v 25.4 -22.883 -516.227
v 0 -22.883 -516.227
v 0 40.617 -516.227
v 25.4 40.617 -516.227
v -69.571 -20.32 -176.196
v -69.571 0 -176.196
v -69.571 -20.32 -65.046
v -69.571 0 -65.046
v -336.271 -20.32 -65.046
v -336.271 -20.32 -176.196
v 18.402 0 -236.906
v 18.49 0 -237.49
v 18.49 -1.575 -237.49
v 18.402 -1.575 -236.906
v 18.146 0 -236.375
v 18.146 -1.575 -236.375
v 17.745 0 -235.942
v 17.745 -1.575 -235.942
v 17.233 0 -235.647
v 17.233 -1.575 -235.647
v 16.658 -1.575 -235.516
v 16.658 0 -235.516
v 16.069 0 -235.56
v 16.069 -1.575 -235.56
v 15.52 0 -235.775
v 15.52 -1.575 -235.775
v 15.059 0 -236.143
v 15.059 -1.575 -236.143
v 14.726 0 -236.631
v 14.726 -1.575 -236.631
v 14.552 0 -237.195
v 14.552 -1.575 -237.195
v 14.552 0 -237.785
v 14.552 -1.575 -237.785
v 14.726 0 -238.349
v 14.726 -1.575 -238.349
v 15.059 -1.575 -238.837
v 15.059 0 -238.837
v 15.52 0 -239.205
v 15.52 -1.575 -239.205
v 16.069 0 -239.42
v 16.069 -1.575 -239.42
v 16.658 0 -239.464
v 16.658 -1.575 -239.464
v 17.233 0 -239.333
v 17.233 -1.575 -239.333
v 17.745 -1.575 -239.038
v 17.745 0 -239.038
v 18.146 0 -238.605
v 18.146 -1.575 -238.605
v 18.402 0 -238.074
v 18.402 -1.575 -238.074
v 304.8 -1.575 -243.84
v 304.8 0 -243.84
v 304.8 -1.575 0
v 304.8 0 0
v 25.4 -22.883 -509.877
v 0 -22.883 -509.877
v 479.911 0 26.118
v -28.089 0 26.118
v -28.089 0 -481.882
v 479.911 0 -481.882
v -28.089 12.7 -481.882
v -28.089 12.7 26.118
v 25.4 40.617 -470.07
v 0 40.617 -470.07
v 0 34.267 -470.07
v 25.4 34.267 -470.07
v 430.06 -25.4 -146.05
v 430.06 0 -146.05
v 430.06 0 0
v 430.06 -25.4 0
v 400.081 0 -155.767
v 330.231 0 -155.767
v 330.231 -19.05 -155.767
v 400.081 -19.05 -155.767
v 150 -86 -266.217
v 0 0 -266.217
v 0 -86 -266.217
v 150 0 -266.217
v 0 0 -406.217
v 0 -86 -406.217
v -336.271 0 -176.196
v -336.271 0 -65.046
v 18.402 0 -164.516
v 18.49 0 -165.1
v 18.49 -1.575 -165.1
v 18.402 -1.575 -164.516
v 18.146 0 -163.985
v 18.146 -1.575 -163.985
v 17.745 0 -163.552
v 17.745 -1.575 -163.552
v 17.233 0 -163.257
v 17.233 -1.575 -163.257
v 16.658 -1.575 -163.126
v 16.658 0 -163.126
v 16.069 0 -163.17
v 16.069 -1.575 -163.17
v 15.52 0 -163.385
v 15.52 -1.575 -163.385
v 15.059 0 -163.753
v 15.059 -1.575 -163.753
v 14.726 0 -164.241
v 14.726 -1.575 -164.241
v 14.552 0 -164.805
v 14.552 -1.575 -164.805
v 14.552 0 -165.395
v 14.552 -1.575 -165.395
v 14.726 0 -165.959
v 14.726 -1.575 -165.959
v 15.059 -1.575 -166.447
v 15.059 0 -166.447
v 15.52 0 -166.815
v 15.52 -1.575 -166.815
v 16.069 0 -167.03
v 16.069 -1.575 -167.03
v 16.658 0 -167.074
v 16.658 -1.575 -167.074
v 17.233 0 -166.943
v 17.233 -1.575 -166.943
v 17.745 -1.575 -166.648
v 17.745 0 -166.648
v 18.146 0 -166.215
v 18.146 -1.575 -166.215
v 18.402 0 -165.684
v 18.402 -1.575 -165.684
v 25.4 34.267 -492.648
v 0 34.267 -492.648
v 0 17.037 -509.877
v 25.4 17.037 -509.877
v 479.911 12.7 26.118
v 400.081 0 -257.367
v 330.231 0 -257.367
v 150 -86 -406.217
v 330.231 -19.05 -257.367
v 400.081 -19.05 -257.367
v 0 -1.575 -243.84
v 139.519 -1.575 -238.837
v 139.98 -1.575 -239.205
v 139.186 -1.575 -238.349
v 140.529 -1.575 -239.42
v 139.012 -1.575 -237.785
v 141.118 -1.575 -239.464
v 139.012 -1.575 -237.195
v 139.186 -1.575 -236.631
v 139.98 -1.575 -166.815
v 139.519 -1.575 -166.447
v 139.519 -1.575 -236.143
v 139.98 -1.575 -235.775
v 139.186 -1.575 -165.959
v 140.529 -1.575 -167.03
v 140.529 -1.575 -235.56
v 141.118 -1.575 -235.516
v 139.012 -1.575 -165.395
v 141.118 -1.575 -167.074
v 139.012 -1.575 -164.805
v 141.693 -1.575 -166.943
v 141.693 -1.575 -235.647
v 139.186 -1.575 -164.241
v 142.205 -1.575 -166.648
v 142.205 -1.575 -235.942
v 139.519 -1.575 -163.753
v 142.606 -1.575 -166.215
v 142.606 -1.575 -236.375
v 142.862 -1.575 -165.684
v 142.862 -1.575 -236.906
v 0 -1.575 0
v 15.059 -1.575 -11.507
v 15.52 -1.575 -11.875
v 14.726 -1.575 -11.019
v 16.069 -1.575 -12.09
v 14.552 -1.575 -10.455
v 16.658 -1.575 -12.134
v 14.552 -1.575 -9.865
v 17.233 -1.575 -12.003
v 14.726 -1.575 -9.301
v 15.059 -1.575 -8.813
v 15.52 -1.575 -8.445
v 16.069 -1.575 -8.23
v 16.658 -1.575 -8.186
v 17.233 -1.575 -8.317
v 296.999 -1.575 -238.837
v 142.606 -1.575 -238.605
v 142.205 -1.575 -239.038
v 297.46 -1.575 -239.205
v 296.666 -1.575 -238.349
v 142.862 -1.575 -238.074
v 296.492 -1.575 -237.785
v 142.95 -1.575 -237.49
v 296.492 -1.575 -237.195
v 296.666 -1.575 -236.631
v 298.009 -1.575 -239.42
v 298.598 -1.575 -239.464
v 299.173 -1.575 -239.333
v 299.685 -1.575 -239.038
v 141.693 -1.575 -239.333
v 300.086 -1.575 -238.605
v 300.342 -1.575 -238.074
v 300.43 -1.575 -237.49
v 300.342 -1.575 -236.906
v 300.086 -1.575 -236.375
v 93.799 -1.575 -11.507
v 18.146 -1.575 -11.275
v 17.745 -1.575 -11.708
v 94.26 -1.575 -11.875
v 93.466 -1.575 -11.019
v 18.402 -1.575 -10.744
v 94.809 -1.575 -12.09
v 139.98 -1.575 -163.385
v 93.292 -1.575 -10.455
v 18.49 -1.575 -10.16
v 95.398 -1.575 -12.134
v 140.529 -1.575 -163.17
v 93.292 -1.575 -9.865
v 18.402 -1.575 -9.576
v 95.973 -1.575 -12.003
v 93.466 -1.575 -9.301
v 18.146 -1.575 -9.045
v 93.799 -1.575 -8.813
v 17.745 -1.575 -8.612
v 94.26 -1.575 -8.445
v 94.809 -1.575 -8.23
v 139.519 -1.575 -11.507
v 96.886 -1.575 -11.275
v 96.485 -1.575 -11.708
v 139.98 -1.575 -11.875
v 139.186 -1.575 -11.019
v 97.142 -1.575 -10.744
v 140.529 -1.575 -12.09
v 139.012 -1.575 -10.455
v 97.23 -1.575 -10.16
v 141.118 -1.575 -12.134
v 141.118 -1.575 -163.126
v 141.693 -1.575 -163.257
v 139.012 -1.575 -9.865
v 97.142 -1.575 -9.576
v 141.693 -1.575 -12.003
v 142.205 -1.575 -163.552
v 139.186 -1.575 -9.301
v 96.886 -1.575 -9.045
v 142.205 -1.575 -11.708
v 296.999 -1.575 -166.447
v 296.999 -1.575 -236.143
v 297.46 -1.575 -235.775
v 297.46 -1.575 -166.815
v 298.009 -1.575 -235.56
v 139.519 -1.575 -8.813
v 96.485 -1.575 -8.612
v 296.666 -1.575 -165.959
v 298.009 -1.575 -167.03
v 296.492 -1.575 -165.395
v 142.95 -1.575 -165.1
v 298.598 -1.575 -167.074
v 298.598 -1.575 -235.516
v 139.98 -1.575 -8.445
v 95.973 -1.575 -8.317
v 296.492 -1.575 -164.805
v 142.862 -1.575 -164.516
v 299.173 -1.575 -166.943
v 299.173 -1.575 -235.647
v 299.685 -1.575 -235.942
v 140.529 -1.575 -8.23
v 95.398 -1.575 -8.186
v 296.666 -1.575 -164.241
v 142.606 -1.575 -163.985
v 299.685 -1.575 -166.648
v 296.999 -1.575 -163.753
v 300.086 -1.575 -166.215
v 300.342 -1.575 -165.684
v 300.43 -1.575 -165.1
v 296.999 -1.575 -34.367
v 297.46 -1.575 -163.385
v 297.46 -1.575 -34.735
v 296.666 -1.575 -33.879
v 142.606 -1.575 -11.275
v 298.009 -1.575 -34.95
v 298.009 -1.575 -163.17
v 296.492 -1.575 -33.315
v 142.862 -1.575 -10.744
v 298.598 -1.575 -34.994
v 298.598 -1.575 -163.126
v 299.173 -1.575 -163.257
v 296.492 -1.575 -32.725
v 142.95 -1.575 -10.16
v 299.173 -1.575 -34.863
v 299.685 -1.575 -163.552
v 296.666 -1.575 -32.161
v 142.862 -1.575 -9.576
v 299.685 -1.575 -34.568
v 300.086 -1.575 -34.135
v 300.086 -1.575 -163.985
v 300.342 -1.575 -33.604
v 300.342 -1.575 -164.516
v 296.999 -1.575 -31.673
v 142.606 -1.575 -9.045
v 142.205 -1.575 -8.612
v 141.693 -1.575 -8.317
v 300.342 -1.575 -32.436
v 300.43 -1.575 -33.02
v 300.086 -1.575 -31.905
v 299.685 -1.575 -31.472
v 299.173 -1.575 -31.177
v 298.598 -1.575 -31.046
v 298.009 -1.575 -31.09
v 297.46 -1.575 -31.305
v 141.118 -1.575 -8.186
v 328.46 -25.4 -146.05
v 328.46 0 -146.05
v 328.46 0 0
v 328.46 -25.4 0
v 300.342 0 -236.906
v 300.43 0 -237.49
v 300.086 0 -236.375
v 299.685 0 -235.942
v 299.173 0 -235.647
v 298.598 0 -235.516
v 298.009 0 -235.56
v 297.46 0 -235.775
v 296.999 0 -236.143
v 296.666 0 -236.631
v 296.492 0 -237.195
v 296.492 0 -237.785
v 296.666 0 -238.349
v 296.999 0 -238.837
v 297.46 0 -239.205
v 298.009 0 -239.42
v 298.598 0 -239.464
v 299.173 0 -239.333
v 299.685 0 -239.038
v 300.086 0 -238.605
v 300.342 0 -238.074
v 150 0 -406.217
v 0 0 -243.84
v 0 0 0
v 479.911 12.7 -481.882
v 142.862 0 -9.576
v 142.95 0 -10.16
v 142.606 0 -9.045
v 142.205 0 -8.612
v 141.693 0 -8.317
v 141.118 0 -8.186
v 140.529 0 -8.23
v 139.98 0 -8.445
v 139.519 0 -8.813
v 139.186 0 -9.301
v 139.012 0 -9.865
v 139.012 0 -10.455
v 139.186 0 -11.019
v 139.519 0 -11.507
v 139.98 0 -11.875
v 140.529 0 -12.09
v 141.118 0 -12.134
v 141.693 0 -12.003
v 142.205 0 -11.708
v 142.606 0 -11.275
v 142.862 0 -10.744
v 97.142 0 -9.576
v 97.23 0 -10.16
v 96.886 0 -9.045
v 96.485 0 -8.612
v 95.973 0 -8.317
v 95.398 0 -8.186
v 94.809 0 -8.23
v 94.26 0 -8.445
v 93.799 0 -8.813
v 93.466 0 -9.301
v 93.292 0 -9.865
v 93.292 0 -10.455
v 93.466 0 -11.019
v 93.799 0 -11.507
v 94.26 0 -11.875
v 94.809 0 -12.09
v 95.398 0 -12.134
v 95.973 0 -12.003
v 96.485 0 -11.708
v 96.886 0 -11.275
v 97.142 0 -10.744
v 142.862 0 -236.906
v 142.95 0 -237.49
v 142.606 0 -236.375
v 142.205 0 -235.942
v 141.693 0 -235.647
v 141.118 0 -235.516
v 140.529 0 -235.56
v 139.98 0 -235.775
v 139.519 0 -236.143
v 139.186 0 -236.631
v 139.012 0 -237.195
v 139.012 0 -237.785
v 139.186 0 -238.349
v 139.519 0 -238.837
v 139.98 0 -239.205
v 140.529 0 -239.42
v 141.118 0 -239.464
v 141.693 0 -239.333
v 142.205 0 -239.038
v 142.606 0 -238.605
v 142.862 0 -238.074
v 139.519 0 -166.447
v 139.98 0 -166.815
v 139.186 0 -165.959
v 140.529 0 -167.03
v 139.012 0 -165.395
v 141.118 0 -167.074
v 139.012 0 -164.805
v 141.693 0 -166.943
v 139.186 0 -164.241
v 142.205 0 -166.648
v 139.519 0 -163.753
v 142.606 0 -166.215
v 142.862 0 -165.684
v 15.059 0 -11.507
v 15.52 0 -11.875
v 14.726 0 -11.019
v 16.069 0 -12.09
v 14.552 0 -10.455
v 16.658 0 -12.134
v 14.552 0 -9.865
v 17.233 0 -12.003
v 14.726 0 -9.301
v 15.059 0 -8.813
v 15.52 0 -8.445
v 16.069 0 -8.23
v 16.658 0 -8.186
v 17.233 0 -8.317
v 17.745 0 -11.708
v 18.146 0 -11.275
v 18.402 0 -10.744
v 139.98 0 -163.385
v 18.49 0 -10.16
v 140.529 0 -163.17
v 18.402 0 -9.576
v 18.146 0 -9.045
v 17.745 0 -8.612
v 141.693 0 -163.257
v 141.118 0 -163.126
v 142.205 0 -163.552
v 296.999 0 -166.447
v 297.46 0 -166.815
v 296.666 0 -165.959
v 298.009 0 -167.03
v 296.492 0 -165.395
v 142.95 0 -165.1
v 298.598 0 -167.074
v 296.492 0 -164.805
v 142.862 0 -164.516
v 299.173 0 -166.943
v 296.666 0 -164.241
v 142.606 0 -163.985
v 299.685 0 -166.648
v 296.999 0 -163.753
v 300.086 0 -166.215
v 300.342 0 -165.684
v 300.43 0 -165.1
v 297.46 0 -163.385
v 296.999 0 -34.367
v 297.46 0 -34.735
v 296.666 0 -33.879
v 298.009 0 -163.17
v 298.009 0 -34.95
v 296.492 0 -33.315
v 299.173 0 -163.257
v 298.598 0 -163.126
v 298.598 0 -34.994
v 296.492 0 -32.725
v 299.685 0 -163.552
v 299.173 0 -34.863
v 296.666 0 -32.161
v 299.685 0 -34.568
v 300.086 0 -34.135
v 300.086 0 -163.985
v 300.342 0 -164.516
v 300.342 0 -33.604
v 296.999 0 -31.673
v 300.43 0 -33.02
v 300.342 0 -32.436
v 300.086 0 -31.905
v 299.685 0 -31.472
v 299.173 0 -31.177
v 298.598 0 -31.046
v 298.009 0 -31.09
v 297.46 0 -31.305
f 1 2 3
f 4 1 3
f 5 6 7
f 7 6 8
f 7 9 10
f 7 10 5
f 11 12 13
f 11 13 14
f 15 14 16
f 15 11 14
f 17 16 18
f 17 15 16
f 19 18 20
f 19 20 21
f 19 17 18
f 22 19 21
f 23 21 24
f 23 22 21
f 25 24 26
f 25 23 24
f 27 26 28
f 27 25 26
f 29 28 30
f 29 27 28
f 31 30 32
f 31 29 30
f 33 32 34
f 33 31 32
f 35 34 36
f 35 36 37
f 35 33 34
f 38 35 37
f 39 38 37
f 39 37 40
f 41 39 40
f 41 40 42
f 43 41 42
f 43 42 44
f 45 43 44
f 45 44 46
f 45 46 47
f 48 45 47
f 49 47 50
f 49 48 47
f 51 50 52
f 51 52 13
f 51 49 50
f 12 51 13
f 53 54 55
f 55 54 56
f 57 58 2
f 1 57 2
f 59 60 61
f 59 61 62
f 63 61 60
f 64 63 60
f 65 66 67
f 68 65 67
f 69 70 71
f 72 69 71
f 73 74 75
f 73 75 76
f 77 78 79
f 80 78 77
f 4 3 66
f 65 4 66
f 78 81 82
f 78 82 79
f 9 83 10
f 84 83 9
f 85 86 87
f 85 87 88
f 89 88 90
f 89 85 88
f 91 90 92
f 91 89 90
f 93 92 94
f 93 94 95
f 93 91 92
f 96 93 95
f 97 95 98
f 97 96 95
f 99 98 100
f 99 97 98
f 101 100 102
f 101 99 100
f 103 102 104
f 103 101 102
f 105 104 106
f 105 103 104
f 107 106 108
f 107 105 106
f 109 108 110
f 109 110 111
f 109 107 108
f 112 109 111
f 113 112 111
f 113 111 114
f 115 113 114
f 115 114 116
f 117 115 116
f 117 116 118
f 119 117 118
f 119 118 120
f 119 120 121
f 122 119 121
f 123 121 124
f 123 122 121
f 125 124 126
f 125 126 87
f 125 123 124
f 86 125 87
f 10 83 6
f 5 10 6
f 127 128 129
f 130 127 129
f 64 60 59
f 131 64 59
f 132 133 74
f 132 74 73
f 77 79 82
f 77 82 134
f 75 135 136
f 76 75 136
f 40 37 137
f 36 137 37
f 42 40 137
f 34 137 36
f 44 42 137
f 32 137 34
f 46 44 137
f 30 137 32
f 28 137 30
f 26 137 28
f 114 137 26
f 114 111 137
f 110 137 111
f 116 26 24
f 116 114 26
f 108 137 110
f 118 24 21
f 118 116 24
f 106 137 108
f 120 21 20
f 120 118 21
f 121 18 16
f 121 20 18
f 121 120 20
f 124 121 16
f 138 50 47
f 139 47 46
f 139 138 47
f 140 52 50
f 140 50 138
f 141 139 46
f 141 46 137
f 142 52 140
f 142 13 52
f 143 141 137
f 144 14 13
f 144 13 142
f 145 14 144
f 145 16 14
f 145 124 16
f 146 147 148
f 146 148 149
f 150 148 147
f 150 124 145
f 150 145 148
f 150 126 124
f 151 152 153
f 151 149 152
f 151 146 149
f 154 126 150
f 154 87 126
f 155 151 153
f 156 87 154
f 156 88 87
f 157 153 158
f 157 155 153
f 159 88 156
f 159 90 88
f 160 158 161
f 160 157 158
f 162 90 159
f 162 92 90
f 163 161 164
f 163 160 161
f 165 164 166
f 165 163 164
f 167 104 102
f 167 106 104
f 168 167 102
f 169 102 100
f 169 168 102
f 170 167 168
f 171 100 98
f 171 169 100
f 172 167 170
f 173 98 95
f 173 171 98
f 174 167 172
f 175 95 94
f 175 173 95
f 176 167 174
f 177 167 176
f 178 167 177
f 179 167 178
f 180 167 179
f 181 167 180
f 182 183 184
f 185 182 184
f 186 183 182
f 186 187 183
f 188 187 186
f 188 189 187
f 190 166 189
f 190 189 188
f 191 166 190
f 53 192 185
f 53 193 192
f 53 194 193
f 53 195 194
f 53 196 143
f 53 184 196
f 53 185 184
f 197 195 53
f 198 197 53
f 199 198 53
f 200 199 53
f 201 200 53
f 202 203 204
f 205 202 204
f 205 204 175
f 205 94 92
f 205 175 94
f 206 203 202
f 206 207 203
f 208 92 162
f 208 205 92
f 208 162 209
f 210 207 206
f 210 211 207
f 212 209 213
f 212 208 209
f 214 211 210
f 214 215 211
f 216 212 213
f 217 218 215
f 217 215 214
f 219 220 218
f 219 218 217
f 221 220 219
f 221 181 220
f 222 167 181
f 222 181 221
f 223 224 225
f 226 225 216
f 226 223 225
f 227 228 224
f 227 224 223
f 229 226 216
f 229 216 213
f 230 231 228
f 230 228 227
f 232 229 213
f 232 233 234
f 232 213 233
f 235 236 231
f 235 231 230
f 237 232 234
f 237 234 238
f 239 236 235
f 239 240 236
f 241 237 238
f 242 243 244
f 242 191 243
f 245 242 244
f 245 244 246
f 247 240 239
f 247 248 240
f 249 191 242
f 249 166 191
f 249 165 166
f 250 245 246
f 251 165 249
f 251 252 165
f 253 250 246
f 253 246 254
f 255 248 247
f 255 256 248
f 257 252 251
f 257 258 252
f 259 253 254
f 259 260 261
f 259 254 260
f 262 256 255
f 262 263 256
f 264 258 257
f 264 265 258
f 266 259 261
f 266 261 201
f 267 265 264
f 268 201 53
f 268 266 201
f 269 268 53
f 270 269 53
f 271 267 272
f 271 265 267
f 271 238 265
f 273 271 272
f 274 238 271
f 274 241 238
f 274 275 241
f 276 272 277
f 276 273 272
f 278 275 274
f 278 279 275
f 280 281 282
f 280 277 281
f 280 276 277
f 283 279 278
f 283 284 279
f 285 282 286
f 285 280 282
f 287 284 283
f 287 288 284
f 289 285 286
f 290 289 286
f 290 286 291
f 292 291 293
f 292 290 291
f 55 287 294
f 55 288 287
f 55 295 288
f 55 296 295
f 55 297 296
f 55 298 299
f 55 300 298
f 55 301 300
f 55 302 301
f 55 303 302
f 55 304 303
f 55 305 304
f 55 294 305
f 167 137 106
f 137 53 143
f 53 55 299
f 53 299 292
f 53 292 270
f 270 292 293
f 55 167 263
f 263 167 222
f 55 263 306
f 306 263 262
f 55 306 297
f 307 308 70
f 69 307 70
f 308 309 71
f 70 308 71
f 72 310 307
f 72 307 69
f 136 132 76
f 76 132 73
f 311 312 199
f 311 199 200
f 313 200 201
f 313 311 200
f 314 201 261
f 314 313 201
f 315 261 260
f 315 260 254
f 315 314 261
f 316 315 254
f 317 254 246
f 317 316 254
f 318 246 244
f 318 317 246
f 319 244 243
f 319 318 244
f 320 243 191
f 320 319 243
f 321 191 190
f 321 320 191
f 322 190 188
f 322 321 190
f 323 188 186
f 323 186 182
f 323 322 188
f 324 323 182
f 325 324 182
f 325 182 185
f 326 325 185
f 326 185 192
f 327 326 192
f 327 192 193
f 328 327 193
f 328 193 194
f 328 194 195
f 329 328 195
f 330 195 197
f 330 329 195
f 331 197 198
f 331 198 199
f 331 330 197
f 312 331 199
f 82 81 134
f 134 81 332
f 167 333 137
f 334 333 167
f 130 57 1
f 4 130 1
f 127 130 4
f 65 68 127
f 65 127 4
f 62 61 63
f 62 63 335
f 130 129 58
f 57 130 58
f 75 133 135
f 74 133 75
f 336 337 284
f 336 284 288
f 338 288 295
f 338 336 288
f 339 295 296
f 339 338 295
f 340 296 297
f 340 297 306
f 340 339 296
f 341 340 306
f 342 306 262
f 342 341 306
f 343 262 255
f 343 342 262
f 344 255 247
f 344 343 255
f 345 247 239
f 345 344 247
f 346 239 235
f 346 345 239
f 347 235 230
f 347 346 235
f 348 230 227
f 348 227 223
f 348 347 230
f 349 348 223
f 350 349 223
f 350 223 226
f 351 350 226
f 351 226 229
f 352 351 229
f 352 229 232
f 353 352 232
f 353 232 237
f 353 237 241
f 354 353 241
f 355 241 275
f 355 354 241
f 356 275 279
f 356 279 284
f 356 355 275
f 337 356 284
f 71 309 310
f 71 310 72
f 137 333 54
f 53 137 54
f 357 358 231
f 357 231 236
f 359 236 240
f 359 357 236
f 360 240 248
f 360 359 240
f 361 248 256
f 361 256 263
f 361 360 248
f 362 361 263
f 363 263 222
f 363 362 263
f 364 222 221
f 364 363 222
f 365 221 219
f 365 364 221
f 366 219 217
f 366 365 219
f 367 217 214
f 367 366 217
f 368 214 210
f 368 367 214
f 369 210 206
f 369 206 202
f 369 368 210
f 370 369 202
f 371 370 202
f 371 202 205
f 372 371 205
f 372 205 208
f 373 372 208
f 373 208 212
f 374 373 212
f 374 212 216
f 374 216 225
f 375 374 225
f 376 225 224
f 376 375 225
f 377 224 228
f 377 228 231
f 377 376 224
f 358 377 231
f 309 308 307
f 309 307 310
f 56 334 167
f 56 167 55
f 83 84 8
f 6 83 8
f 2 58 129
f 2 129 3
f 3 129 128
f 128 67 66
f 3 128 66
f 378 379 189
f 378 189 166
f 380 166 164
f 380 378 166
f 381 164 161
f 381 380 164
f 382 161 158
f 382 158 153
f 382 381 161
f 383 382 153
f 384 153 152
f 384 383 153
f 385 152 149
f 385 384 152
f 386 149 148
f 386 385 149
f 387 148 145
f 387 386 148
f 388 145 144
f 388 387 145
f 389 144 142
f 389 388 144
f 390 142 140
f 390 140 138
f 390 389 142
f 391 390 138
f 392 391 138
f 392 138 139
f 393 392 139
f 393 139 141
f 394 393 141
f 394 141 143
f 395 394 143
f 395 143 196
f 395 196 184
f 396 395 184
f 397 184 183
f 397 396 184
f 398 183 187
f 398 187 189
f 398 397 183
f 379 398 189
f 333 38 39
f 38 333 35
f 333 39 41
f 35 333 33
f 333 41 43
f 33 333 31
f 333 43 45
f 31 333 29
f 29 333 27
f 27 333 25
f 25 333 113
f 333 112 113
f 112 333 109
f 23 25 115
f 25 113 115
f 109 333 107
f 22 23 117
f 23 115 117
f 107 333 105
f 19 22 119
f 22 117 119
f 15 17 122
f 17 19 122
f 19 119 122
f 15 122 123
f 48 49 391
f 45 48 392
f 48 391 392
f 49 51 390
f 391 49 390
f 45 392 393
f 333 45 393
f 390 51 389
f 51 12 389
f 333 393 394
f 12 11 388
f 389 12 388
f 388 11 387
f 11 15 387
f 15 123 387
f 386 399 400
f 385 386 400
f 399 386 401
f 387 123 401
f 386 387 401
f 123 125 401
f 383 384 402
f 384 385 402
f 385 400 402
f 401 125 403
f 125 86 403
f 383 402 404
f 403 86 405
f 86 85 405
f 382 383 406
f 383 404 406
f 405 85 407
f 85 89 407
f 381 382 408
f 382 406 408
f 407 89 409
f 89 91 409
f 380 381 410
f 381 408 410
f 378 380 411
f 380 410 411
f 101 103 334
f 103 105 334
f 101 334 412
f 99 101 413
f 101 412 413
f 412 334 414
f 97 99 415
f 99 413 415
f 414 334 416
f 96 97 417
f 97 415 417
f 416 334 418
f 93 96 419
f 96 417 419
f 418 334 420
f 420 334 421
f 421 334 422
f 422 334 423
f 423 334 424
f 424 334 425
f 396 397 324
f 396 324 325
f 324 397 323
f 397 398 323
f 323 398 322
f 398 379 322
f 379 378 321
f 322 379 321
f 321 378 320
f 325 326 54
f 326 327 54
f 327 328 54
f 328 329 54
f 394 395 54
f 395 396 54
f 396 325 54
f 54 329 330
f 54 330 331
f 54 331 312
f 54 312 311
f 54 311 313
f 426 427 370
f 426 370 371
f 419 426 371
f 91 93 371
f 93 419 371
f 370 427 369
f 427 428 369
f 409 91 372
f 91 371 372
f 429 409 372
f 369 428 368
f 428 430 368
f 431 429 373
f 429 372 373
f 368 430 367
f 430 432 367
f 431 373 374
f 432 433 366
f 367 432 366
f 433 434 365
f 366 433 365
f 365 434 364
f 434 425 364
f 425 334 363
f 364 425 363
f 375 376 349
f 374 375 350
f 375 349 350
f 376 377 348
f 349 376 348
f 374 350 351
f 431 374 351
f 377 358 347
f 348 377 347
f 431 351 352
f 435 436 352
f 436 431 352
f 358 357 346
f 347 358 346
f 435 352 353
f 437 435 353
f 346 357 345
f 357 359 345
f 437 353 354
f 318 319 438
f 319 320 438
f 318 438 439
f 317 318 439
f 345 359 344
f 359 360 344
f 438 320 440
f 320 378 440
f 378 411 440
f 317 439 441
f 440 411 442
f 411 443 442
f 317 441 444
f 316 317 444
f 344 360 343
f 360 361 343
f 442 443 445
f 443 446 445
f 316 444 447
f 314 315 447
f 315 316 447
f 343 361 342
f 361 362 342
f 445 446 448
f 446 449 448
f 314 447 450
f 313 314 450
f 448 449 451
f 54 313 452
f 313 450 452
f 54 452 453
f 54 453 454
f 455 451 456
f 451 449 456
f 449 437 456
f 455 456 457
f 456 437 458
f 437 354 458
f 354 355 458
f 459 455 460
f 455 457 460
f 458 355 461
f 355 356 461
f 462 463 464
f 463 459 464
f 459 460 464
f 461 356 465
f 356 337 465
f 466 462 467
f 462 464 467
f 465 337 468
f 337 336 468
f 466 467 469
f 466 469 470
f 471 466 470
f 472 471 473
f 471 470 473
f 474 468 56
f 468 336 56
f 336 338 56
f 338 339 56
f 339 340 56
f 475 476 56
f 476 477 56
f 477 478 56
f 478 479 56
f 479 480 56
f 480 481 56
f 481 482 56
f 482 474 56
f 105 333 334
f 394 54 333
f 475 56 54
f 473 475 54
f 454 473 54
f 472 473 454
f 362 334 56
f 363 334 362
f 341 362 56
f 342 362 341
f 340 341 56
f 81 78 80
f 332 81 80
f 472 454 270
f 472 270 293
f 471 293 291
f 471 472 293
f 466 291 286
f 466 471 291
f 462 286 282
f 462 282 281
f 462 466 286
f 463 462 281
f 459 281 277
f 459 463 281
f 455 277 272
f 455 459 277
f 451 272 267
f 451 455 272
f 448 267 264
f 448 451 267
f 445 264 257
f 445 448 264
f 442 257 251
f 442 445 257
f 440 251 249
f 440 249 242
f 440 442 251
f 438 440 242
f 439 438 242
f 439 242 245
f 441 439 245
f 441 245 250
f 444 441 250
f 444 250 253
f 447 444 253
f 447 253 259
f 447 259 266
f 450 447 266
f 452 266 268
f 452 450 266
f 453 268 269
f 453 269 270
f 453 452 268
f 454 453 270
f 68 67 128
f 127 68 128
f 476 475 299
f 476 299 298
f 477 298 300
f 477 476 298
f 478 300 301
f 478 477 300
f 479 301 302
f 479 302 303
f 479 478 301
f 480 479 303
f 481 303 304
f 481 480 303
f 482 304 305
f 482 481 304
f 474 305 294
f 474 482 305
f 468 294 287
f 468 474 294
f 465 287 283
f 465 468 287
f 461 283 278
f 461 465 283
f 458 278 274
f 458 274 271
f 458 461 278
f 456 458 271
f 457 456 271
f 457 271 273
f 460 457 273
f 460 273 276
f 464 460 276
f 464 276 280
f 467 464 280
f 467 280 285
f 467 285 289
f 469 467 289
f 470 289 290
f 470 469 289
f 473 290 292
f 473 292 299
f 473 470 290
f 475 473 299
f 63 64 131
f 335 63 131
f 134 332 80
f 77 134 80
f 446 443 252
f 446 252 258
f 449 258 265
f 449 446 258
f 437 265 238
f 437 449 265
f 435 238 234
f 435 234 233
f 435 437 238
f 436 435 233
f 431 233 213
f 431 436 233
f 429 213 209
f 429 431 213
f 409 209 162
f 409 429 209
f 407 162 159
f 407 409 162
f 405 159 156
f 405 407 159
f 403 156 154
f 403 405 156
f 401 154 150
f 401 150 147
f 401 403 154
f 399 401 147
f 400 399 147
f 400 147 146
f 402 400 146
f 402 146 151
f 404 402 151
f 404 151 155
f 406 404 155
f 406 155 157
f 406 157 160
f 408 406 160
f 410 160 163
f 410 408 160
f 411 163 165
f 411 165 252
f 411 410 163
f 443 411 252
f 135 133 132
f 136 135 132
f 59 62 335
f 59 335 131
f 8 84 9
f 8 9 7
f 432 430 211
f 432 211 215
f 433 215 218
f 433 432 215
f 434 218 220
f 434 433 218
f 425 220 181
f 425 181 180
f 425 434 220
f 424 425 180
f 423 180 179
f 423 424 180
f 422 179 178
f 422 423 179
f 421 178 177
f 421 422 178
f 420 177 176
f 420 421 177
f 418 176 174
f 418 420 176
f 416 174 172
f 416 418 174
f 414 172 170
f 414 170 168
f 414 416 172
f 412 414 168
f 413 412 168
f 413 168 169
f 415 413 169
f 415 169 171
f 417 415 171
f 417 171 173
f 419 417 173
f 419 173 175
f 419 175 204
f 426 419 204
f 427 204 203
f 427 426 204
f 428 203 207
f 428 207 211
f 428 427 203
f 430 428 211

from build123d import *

# Parameters (mm, degrees)
F0_W      = 304.8
F0_H      = 243.84
F0_R      = 1.98
F1_DEPTH  = 1.5748
F2_W      = 150
F2_H      = 140
F3_DEPTH  = 86
F4_W      = 266.7
F4_H      = 111.1504
F5_DEPTH  = 20.32
F6_W      = 101.6
F6_H      = 146.05
F7_DEPTH  = 25.4
F8_W      = 69.85
F8_H      = 101.6
F9_DEPTH  = 19.05
F10_W     = 508
F10_H     = 508
F11_DEPTH = 12.7
F13_DEPTH = 25.4


with BuildPart() as f1:
    # F0 (on Front) → F1 (new body)
    with BuildSketch(Plane.XZ):
        with Locations((152.4, -121.92)):
            Rectangle(F0_W, F0_H)
        with Locations((16.51, -237.49)):
            Circle(F0_R, mode=Mode.SUBTRACT)
        with Locations((140.97, -237.49)):
            Circle(F0_R, mode=Mode.SUBTRACT)
        with Locations((16.51, -165.1)):
            Circle(F0_R, mode=Mode.SUBTRACT)
        with Locations((140.97, -165.1)):
            Circle(F0_R, mode=Mode.SUBTRACT)
        with Locations((298.45, -237.49)):
            Circle(F0_R, mode=Mode.SUBTRACT)
        with Locations((298.45, -165.1)):
            Circle(F0_R, mode=Mode.SUBTRACT)
        with Locations((16.51, -10.16)):
            Circle(F0_R, mode=Mode.SUBTRACT)
        with Locations((95.25, -10.16)):
            Circle(F0_R, mode=Mode.SUBTRACT)
        with Locations((140.97, -10.16)):
            Circle(F0_R, mode=Mode.SUBTRACT)
        with Locations((298.45, -33.02)):
            Circle(F0_R, mode=Mode.SUBTRACT)
    extrude(amount=F1_DEPTH)


with BuildPart() as f3:
    # F2 (on Front) → F3 (new body)
    with BuildSketch(Plane.XZ):
        with Locations((75, -336.217142)):
            Rectangle(F2_W, F2_H)
    extrude(amount=F3_DEPTH)


with BuildPart() as f5:
    # F4 (on Front) → F5 (new body)
    with BuildSketch(Plane.XZ):
        with Locations((-202.921405, -120.621153)):
            Rectangle(F4_W, F4_H)
    extrude(amount=F5_DEPTH)


with BuildPart() as f7:
    # F6 (on Front) → F7 (new body)
    with BuildSketch(Plane.XZ):
        with Locations((379.260089, -73.025)):
            Rectangle(F6_W, F6_H)
    extrude(amount=F7_DEPTH)


with BuildPart() as f9:
    # F8 (on Front) → F9 (new body)
    with BuildSketch(Plane.XZ):
        with Locations((365.155711, -206.566785)):
            Rectangle(F8_W, F8_H)
    extrude(amount=F9_DEPTH)


with BuildPart() as f11:
    # F10 (on Front) → F11 (new body)
    with BuildSketch(Plane.XZ):
        with Locations((225.910594, -227.881701)):
            Rectangle(F10_W, F10_H)
    extrude(amount=-F11_DEPTH)


with BuildPart() as f13:
    # F12 (on Right) → F13 (new body)
    with BuildSketch(Plane.YZ):
        Polygon((40.616777, -470.069736), (34.266777, -470.069736), (34.266777, -492.64796), (17.037274, -509.877463), (-22.883223, -509.877463), (-22.883223, -516.227463), (40.616777, -516.227463), align=None)
    extrude(amount=F13_DEPTH)


solid = Compound([f1.part, f3.part, f5.part, f7.part, f9.part, f11.part, f13.part])
